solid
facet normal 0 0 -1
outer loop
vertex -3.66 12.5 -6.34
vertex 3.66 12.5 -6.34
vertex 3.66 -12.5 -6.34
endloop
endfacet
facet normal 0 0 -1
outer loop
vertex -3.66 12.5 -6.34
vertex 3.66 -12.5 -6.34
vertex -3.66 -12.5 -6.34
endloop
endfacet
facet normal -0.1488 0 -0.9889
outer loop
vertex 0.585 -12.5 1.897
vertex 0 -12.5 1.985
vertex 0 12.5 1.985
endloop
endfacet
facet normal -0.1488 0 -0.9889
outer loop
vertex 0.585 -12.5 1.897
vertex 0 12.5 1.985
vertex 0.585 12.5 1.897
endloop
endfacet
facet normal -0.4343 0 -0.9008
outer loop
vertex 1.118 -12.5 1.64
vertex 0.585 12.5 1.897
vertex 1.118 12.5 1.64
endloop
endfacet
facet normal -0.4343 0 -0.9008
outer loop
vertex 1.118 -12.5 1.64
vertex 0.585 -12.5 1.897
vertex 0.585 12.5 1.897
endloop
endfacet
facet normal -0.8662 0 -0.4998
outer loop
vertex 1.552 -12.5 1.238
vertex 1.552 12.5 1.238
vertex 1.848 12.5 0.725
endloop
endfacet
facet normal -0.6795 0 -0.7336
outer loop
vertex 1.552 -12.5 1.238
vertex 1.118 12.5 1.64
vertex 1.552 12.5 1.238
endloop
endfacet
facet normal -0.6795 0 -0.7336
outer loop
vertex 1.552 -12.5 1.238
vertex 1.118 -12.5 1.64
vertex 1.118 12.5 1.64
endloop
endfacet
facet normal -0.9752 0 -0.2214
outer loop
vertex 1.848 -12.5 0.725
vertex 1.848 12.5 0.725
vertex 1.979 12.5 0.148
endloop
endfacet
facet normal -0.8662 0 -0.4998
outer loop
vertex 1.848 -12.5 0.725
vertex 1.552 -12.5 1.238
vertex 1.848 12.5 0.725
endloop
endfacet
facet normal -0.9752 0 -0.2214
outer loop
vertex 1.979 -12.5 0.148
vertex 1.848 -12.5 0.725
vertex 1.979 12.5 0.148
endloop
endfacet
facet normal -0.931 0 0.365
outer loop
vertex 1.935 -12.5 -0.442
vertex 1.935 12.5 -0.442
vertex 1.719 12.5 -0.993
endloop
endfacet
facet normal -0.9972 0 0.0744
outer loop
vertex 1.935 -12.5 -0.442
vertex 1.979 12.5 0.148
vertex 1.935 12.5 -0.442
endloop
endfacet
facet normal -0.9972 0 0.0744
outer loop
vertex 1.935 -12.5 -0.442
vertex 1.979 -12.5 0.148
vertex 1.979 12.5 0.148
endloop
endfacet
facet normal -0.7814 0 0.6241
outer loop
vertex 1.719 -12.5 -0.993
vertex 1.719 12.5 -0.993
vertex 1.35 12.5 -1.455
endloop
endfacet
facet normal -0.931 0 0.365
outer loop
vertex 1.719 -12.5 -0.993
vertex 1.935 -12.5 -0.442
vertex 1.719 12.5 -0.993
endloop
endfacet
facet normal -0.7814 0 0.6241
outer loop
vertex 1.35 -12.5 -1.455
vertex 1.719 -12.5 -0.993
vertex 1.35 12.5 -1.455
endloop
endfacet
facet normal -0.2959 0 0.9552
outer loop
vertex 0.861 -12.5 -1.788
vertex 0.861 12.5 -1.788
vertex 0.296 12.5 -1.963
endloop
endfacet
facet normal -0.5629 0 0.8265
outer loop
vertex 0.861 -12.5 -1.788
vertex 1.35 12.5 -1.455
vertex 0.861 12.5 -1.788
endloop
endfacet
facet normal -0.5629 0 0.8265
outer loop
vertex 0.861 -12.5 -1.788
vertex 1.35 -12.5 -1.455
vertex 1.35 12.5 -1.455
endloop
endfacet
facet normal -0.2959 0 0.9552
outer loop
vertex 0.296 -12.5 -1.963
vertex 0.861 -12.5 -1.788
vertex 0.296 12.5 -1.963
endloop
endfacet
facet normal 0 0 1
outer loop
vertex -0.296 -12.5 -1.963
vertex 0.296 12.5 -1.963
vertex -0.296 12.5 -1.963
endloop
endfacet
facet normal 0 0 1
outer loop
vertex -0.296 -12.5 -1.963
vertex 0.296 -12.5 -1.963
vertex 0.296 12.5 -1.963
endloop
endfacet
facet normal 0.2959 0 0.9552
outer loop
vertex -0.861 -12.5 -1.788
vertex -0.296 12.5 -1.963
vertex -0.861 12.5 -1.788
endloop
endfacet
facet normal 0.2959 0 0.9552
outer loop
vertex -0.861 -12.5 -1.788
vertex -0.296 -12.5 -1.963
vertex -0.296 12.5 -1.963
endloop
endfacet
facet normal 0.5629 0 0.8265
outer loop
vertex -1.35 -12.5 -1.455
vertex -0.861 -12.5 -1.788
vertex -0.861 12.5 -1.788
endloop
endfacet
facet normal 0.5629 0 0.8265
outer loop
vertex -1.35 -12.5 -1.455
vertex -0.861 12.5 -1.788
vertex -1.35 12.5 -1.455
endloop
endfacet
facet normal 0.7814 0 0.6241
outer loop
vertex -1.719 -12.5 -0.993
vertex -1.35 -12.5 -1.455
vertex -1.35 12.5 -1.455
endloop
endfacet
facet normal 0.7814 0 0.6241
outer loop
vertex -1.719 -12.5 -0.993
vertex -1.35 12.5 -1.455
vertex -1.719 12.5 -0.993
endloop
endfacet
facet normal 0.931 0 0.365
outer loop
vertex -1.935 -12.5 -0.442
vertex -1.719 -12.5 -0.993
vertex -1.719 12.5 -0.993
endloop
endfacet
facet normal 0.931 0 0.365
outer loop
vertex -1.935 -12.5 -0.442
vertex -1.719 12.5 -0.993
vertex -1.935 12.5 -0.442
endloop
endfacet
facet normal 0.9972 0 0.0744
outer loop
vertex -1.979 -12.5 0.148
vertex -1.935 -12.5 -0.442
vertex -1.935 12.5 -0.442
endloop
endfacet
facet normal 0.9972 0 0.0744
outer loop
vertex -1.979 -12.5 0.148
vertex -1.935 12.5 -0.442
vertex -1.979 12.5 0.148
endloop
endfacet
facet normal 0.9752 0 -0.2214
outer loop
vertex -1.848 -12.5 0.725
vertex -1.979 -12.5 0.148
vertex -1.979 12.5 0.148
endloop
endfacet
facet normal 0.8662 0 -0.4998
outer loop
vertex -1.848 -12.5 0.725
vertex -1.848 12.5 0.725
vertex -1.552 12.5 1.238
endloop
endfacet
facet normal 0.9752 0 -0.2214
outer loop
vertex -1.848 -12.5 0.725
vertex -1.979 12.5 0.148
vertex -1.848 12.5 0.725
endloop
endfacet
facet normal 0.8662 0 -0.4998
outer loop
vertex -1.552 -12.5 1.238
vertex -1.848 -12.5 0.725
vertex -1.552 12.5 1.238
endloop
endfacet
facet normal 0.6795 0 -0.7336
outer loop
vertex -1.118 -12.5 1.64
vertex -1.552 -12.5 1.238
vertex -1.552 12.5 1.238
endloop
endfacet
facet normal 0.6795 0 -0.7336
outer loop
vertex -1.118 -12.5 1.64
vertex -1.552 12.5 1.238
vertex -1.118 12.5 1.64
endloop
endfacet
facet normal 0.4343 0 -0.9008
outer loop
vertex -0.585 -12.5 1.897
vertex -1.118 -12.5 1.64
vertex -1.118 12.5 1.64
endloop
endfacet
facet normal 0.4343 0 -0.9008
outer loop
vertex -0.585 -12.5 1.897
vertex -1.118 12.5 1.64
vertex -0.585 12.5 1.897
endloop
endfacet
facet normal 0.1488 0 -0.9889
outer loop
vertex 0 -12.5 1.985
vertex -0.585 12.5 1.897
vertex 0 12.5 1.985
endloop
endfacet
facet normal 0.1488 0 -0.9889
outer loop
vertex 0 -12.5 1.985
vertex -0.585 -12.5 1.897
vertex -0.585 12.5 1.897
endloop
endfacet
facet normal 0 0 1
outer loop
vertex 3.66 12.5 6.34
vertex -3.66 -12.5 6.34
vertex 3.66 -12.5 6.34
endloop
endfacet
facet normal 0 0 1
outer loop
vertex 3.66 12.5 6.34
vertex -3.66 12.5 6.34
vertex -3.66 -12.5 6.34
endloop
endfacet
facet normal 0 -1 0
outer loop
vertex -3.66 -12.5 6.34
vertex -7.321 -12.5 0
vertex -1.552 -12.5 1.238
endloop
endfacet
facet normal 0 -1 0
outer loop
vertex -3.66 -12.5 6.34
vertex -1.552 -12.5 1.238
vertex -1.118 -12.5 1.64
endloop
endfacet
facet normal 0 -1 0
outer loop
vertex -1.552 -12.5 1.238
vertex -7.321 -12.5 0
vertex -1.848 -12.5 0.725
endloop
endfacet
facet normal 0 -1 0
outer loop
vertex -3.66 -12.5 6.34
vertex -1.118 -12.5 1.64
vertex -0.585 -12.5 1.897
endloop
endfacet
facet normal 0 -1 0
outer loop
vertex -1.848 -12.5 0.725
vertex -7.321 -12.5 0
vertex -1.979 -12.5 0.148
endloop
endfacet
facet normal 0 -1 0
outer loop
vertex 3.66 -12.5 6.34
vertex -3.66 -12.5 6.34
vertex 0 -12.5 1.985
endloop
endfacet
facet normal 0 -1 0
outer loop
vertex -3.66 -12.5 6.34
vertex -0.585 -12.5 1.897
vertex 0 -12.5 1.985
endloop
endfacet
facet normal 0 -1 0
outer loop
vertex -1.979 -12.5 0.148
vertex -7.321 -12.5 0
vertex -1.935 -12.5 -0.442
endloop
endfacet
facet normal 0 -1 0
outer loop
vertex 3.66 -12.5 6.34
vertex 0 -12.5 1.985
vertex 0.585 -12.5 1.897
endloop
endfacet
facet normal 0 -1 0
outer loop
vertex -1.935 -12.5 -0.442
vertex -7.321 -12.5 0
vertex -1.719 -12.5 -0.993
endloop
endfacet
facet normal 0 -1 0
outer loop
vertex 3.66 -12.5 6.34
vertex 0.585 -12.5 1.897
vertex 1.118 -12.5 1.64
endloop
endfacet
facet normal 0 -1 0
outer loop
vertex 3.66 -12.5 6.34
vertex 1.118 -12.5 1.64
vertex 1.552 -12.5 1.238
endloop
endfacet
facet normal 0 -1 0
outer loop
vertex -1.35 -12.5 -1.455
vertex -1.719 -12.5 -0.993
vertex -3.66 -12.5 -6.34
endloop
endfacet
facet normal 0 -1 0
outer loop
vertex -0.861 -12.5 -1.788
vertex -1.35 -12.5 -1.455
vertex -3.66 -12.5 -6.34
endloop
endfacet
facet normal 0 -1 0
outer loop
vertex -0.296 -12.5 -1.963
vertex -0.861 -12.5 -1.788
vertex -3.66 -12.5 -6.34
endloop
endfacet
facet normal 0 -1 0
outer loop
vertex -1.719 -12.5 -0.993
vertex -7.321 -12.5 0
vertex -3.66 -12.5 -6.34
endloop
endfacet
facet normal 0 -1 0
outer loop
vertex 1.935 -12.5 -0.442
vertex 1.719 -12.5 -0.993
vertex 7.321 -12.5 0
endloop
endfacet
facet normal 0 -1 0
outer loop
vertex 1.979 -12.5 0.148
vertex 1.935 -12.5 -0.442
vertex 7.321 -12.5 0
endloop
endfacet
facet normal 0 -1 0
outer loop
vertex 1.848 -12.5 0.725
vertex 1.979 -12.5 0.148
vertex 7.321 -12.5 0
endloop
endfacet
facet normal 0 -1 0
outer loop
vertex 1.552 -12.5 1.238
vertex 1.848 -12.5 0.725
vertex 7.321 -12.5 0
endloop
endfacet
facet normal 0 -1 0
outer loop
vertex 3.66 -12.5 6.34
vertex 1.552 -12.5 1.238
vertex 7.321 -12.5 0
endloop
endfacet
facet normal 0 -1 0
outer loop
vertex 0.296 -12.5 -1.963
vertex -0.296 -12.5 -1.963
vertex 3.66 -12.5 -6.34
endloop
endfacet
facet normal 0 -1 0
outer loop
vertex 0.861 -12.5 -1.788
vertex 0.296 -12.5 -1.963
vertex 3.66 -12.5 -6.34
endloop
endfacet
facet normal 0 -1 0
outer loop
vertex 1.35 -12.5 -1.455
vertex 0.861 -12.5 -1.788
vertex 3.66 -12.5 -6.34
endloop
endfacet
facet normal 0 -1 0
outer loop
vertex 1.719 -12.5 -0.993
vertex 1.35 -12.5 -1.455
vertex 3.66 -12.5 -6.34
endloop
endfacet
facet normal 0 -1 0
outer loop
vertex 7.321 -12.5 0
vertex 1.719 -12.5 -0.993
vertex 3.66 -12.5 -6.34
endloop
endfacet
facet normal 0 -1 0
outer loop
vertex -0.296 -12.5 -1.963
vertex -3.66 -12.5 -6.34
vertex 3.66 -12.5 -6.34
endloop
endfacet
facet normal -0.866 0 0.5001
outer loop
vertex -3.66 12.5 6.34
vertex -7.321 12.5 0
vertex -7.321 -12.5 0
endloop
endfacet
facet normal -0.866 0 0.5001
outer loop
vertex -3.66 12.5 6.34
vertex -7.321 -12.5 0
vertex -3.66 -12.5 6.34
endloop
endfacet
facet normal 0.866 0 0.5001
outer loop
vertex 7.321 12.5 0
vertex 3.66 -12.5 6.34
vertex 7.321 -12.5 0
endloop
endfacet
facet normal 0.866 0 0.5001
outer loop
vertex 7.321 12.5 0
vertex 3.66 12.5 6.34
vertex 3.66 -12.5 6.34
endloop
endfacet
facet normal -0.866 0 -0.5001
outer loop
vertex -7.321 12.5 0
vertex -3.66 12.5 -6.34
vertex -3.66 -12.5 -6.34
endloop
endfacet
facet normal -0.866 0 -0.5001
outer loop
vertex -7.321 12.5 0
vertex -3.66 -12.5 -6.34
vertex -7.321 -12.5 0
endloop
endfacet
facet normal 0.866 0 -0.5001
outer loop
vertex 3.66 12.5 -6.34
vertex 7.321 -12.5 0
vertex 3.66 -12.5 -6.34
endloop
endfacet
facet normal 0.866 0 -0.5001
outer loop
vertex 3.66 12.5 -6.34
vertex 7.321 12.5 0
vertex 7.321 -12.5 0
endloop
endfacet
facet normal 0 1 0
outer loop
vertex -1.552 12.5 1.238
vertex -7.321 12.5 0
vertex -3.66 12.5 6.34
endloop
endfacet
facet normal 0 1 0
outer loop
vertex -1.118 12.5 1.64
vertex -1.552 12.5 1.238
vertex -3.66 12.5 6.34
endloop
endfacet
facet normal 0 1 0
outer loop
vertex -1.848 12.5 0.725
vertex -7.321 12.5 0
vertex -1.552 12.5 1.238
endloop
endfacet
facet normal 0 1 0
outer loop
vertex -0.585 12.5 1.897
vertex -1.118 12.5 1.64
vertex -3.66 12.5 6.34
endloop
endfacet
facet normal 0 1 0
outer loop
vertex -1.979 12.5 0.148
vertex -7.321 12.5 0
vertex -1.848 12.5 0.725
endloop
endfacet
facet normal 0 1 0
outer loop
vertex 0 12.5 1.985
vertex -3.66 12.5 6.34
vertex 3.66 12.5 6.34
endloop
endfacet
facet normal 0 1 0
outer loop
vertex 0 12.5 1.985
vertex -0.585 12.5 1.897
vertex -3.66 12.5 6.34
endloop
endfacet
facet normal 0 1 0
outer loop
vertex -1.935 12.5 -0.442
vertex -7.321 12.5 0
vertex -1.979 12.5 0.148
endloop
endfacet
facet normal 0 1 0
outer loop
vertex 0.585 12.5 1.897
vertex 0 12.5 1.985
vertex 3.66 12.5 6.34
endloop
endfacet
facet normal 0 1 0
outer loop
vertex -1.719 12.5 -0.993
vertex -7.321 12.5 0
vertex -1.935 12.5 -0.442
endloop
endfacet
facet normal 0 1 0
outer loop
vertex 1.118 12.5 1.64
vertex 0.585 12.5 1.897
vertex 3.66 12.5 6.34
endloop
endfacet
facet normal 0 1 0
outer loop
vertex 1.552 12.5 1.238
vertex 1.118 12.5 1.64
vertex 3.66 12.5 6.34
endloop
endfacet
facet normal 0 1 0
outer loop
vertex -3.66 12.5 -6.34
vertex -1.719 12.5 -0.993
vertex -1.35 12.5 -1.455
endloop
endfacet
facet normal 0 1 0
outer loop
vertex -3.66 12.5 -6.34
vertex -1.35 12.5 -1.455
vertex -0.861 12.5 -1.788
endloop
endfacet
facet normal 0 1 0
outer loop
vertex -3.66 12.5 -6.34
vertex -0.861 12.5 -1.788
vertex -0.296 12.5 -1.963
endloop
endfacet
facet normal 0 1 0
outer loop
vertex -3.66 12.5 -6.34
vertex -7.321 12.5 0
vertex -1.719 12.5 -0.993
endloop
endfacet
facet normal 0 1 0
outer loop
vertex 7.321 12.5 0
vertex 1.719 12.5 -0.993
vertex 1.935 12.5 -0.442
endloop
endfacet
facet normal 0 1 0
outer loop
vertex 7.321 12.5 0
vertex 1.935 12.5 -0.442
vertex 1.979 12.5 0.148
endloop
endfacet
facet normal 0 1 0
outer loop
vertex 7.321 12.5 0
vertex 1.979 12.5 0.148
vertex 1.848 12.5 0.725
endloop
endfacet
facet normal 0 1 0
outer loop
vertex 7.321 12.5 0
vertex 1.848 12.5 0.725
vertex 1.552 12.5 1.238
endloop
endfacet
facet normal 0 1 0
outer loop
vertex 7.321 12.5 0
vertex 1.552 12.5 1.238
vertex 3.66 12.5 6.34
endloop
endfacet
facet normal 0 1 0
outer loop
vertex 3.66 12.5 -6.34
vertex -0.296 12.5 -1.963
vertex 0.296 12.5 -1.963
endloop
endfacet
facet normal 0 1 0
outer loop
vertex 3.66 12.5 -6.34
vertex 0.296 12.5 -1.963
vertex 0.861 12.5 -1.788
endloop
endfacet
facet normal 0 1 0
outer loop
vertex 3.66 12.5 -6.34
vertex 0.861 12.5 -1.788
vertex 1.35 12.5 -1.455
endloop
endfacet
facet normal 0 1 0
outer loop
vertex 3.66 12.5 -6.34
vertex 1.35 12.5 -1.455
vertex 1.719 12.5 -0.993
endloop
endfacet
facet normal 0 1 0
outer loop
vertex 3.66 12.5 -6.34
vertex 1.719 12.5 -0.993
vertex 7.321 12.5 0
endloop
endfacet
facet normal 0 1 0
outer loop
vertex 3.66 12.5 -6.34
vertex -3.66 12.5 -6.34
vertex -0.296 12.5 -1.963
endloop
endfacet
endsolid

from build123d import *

# Parameters (mm, degrees)
BOSS_EXTRUDE1_DEPTH     = 12.5
CUT_EXTRUDE1_DEPTH      = 16.812644729
CUT_EXTRUDE1_DEPTH_BACK = 16.812644729
SKETCH3_R               = 1.985


with BuildPart() as part:
    # Sketch2 → Boss-Extrude1 (new, symmetric)
    with BuildSketch(Plane(origin=(0, 0, 0), x_dir=(1, 0, 0), z_dir=(0, 1, 0))):
        Polygon((7.320801413, 0), (3.660400707, 6.34), (-3.660400707, 6.34), (-7.320801413, 0), (-3.660400707, -6.34), (3.660400707, -6.34), align=None)
    extrude(amount=BOSS_EXTRUDE1_DEPTH, both=True)

    # Sketch3 → Cut-Extrude1 (cut, two sides: drawn at the far end of the back side and taken through both)
    with BuildSketch(Plane(origin=(0, 0, 0), x_dir=(1, 0, 0), z_dir=(0, 1, 0)).offset(-CUT_EXTRUDE1_DEPTH_BACK)):
        with Locations(Location((0, 0, 0), (0, 0, 270))):
            Circle(SKETCH3_R)
    extrude(amount=CUT_EXTRUDE1_DEPTH + CUT_EXTRUDE1_DEPTH_BACK, mode=Mode.SUBTRACT)


solid = part.part
